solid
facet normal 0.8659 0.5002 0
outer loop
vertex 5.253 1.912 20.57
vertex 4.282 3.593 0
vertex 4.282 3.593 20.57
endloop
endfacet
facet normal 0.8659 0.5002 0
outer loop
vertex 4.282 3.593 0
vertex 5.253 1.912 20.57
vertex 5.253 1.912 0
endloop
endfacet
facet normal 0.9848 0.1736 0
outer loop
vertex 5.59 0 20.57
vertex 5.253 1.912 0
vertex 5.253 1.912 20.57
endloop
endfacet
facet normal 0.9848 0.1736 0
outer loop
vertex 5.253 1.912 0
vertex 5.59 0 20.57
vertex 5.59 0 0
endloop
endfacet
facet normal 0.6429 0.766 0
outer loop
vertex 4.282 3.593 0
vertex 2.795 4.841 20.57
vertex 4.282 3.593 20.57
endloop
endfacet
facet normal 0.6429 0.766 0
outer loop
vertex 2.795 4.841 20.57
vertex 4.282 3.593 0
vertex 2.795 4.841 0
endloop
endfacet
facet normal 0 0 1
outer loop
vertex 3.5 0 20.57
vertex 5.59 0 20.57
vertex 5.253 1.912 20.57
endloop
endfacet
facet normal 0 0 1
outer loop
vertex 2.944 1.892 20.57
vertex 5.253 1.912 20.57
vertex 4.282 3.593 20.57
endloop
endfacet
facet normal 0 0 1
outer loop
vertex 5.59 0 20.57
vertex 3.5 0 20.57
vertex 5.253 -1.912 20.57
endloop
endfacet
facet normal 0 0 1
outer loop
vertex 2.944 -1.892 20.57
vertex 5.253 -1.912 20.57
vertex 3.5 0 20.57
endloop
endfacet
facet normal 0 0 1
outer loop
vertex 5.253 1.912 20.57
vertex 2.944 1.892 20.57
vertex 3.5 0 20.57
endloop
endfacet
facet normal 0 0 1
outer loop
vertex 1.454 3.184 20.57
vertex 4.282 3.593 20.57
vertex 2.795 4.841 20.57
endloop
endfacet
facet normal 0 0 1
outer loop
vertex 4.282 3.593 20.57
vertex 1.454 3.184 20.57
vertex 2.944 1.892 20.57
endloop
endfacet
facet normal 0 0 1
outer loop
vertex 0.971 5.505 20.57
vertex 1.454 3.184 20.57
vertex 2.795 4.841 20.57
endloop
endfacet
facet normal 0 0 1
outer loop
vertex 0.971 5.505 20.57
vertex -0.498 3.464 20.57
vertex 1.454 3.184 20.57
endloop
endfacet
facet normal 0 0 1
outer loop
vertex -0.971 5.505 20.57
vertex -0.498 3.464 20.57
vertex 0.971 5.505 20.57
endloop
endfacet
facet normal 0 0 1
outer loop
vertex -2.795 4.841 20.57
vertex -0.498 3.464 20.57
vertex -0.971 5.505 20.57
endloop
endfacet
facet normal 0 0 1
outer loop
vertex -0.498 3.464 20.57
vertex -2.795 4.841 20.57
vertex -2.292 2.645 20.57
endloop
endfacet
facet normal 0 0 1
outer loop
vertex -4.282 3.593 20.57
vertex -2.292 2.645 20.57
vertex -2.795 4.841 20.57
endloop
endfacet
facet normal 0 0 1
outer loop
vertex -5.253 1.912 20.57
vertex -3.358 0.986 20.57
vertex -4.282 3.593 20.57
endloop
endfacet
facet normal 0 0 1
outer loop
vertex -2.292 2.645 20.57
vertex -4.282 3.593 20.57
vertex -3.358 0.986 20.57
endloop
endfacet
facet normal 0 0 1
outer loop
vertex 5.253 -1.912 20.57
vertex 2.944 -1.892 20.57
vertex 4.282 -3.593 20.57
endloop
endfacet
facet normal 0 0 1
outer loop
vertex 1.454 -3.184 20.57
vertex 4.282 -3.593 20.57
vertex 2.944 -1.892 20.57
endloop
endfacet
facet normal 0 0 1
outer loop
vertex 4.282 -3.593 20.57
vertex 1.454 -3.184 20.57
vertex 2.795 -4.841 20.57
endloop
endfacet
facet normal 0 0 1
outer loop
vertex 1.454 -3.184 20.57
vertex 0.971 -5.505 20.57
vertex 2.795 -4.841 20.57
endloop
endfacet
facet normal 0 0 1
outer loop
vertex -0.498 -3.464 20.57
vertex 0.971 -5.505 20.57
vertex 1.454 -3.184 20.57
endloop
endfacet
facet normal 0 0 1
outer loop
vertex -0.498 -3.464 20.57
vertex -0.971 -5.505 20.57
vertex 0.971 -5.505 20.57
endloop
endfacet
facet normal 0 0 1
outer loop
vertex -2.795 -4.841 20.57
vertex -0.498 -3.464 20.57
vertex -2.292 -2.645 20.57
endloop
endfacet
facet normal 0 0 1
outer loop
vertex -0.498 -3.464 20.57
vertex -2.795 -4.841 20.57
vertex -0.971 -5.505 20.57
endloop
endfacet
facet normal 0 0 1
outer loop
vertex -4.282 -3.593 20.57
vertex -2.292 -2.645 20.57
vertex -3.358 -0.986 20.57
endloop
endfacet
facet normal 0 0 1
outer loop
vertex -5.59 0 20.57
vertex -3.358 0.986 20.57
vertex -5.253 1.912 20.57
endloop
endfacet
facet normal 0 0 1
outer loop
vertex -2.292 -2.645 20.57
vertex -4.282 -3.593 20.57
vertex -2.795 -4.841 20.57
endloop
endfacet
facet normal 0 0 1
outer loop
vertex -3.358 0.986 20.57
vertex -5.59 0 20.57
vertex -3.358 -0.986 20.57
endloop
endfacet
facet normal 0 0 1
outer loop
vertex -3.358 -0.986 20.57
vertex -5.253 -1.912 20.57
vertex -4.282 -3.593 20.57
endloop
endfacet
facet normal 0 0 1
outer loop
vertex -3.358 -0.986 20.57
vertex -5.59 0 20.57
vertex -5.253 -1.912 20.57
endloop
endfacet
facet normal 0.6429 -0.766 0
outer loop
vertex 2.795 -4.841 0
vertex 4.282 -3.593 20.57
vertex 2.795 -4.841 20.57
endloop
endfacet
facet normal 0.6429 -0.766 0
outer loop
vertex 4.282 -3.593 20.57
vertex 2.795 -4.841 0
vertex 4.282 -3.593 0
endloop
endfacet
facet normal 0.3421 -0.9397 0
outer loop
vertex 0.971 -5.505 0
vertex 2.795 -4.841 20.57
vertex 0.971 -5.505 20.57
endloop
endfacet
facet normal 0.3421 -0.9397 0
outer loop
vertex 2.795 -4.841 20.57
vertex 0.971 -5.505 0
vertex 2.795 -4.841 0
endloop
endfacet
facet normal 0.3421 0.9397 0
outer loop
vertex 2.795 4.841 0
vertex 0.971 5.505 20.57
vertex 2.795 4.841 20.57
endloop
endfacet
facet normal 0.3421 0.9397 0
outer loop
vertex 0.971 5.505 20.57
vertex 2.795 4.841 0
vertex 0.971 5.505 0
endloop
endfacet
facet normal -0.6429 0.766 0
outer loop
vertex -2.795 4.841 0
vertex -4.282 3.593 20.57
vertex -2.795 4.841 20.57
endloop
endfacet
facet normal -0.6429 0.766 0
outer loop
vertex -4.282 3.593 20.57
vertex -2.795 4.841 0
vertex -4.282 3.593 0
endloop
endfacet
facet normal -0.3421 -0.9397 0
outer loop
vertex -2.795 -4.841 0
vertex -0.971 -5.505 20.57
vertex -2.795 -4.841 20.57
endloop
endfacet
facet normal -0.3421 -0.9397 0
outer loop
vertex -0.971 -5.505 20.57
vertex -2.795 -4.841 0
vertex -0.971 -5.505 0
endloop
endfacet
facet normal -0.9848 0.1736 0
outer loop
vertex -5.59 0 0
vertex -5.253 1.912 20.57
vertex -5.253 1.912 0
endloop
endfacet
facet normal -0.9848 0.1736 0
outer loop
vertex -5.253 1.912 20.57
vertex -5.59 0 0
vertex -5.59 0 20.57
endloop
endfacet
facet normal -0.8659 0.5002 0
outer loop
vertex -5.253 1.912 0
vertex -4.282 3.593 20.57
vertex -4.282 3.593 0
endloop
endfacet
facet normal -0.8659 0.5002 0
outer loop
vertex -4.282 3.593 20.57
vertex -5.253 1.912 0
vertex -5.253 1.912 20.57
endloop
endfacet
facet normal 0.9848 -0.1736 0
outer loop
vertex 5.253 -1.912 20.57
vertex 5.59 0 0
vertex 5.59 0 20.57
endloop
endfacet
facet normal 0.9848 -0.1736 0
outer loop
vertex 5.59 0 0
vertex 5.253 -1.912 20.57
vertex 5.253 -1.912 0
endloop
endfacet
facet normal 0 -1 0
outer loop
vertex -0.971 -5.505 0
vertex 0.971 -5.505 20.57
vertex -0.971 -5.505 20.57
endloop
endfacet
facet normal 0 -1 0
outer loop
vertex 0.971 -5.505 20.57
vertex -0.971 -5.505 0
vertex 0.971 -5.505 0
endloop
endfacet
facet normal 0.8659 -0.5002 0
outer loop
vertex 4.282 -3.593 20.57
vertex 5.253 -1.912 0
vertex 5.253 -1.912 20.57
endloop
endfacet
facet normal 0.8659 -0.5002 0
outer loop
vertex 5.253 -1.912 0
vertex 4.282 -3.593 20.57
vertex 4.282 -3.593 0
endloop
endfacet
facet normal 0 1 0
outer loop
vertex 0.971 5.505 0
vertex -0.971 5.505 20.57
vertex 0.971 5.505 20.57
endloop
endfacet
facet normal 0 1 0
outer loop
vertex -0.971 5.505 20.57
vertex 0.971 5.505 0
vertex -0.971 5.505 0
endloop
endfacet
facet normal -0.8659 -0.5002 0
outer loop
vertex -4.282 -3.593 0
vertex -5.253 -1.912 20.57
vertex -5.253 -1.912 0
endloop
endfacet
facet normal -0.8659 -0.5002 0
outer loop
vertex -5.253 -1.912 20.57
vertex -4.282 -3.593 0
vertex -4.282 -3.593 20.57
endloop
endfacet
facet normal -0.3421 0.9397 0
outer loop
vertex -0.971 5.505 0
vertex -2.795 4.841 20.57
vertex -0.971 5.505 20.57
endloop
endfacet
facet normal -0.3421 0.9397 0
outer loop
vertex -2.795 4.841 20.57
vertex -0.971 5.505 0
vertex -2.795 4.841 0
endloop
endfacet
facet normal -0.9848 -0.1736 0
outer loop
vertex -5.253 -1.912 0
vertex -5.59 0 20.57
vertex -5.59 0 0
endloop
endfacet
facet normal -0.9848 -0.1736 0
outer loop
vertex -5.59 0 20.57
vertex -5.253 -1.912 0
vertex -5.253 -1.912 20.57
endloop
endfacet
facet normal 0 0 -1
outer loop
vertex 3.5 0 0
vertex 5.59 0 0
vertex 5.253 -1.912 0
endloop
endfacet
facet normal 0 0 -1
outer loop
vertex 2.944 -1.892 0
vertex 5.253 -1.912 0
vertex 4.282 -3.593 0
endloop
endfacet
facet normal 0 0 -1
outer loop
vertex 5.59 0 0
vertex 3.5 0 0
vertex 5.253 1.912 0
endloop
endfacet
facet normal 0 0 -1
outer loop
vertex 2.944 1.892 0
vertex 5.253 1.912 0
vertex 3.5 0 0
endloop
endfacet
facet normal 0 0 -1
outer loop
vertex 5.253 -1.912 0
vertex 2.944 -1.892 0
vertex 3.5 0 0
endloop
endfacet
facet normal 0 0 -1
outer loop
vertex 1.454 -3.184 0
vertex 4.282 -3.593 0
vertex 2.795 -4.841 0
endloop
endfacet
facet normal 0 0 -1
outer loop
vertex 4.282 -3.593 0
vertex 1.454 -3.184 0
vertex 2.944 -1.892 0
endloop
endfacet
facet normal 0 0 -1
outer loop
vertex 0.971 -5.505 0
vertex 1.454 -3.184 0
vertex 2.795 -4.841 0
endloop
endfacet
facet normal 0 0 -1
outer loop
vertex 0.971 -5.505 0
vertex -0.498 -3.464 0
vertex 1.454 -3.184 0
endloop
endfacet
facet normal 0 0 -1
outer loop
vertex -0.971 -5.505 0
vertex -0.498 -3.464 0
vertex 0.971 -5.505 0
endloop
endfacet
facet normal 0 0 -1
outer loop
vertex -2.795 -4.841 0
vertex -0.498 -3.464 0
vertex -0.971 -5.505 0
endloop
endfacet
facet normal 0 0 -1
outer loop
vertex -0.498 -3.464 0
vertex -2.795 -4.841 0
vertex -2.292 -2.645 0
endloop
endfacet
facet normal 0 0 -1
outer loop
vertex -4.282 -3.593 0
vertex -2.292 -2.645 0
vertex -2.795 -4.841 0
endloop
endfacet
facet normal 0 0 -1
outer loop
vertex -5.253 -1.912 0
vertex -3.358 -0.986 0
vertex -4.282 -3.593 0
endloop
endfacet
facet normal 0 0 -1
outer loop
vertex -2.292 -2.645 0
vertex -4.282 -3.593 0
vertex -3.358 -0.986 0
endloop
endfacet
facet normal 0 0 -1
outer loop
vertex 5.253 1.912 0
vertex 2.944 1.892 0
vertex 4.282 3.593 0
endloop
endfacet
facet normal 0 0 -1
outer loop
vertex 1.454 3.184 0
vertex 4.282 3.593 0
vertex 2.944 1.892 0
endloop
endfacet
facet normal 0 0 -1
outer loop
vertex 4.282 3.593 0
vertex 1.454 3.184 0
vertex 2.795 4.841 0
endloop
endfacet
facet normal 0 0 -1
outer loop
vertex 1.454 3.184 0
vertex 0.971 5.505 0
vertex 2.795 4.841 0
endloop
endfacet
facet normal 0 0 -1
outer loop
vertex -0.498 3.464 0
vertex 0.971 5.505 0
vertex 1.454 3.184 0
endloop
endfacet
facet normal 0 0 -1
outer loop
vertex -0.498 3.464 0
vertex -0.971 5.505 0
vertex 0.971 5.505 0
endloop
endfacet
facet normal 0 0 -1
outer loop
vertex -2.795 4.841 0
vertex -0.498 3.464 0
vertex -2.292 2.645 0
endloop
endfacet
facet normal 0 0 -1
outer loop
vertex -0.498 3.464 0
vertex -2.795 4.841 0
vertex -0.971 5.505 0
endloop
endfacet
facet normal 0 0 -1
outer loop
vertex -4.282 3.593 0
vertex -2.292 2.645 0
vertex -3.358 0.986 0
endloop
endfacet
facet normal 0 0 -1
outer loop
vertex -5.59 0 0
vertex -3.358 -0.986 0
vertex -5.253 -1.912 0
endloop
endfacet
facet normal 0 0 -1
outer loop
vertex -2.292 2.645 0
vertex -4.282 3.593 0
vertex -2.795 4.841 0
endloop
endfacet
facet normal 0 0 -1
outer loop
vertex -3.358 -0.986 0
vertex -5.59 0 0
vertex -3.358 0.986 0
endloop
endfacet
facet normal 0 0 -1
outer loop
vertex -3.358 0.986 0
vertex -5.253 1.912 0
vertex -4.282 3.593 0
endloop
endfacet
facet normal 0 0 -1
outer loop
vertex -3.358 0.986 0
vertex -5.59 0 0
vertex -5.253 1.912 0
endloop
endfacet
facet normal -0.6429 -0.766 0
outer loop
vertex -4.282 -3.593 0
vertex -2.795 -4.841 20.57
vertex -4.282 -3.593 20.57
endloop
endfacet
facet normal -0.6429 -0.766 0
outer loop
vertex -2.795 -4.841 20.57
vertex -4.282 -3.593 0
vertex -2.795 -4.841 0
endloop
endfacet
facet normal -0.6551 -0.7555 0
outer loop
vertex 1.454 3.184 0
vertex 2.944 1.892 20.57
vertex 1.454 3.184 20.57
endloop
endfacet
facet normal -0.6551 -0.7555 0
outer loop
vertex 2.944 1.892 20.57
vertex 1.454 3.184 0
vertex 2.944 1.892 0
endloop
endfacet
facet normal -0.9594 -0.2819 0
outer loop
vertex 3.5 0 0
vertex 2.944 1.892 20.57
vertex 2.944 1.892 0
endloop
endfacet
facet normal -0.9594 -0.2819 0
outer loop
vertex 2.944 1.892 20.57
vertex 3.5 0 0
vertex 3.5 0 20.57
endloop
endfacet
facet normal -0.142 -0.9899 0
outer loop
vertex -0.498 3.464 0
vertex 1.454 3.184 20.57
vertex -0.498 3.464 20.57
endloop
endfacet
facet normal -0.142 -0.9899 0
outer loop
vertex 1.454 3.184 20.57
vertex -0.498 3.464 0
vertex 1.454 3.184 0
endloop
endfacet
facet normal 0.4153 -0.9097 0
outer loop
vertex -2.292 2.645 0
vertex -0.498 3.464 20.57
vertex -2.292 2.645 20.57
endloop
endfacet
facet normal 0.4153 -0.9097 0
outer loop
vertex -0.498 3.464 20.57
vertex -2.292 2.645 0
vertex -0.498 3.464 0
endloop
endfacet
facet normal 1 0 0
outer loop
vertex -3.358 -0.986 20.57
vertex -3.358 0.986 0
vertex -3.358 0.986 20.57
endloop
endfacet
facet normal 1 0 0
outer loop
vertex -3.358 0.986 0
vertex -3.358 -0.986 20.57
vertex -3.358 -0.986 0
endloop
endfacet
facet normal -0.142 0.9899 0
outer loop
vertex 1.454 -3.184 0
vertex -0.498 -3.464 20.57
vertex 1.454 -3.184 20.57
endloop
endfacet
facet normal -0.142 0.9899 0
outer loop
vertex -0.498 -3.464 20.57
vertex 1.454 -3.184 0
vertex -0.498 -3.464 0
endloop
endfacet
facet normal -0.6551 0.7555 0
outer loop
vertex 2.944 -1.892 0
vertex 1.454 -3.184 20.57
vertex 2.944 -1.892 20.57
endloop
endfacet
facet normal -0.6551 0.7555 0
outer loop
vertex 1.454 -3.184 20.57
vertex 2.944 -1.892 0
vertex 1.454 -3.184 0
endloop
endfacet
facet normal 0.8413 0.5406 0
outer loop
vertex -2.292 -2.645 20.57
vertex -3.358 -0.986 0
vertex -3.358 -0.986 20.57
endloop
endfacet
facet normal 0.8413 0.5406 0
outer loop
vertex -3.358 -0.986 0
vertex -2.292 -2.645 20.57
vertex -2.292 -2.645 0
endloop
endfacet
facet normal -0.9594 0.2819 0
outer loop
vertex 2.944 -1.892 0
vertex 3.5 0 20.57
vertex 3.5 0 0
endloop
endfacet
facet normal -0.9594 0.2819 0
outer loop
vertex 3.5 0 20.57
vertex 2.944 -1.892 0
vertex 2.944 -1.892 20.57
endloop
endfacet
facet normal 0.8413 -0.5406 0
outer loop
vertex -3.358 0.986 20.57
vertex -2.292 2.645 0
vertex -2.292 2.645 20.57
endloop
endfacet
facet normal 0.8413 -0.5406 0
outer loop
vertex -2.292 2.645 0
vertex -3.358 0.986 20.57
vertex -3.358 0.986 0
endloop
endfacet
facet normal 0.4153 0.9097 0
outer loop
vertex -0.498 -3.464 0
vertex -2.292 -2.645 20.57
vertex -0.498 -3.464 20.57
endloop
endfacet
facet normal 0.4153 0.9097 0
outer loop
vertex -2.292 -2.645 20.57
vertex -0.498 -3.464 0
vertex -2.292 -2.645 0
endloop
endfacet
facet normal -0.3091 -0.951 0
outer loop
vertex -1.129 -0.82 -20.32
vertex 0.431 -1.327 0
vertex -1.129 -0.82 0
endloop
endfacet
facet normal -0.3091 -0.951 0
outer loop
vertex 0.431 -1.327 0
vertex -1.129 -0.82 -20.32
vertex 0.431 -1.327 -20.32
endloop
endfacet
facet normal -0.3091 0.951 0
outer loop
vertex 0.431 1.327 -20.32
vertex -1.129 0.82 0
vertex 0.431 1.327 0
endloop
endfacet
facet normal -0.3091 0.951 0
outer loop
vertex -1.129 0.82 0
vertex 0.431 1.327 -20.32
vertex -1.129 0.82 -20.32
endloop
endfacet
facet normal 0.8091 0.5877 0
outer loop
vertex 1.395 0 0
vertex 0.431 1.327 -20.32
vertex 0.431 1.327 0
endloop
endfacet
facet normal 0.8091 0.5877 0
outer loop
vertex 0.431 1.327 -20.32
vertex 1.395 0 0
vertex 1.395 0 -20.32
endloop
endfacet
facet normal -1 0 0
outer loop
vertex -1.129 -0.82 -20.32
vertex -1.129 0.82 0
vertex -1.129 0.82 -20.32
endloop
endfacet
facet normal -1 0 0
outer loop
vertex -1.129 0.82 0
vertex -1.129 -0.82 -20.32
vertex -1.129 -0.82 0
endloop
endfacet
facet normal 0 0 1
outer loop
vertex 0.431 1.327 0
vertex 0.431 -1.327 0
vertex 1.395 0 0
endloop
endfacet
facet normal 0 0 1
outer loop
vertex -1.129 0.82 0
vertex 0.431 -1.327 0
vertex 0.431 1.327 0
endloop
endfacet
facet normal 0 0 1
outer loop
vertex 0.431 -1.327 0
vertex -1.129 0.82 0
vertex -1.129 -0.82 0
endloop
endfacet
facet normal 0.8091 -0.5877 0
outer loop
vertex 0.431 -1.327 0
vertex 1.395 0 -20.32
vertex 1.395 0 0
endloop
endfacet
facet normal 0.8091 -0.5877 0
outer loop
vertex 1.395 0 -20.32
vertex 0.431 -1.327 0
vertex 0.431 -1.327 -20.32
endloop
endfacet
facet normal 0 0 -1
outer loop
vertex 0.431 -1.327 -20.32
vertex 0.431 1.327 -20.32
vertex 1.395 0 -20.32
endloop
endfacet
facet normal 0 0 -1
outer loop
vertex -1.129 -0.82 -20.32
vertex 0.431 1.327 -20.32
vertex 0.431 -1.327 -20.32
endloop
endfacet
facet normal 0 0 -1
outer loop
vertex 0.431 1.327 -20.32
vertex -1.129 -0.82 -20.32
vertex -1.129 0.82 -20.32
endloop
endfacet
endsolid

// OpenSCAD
module BUP_3770(color=[1,0,0]) {
    // https://muellerelectric.com/wp-content/uploads/DS-BU-P3770.pdf
    color(color) {
        difference() {
            cylinder(h=20.57, d=11.18);
            cylinder(h=21, d=7);
        }
    }
    color([.8,.7,.1])
        translate([0,0,-20.32])
            cylinder(h=20.32, d=2.79);
}

BUP_3770();
